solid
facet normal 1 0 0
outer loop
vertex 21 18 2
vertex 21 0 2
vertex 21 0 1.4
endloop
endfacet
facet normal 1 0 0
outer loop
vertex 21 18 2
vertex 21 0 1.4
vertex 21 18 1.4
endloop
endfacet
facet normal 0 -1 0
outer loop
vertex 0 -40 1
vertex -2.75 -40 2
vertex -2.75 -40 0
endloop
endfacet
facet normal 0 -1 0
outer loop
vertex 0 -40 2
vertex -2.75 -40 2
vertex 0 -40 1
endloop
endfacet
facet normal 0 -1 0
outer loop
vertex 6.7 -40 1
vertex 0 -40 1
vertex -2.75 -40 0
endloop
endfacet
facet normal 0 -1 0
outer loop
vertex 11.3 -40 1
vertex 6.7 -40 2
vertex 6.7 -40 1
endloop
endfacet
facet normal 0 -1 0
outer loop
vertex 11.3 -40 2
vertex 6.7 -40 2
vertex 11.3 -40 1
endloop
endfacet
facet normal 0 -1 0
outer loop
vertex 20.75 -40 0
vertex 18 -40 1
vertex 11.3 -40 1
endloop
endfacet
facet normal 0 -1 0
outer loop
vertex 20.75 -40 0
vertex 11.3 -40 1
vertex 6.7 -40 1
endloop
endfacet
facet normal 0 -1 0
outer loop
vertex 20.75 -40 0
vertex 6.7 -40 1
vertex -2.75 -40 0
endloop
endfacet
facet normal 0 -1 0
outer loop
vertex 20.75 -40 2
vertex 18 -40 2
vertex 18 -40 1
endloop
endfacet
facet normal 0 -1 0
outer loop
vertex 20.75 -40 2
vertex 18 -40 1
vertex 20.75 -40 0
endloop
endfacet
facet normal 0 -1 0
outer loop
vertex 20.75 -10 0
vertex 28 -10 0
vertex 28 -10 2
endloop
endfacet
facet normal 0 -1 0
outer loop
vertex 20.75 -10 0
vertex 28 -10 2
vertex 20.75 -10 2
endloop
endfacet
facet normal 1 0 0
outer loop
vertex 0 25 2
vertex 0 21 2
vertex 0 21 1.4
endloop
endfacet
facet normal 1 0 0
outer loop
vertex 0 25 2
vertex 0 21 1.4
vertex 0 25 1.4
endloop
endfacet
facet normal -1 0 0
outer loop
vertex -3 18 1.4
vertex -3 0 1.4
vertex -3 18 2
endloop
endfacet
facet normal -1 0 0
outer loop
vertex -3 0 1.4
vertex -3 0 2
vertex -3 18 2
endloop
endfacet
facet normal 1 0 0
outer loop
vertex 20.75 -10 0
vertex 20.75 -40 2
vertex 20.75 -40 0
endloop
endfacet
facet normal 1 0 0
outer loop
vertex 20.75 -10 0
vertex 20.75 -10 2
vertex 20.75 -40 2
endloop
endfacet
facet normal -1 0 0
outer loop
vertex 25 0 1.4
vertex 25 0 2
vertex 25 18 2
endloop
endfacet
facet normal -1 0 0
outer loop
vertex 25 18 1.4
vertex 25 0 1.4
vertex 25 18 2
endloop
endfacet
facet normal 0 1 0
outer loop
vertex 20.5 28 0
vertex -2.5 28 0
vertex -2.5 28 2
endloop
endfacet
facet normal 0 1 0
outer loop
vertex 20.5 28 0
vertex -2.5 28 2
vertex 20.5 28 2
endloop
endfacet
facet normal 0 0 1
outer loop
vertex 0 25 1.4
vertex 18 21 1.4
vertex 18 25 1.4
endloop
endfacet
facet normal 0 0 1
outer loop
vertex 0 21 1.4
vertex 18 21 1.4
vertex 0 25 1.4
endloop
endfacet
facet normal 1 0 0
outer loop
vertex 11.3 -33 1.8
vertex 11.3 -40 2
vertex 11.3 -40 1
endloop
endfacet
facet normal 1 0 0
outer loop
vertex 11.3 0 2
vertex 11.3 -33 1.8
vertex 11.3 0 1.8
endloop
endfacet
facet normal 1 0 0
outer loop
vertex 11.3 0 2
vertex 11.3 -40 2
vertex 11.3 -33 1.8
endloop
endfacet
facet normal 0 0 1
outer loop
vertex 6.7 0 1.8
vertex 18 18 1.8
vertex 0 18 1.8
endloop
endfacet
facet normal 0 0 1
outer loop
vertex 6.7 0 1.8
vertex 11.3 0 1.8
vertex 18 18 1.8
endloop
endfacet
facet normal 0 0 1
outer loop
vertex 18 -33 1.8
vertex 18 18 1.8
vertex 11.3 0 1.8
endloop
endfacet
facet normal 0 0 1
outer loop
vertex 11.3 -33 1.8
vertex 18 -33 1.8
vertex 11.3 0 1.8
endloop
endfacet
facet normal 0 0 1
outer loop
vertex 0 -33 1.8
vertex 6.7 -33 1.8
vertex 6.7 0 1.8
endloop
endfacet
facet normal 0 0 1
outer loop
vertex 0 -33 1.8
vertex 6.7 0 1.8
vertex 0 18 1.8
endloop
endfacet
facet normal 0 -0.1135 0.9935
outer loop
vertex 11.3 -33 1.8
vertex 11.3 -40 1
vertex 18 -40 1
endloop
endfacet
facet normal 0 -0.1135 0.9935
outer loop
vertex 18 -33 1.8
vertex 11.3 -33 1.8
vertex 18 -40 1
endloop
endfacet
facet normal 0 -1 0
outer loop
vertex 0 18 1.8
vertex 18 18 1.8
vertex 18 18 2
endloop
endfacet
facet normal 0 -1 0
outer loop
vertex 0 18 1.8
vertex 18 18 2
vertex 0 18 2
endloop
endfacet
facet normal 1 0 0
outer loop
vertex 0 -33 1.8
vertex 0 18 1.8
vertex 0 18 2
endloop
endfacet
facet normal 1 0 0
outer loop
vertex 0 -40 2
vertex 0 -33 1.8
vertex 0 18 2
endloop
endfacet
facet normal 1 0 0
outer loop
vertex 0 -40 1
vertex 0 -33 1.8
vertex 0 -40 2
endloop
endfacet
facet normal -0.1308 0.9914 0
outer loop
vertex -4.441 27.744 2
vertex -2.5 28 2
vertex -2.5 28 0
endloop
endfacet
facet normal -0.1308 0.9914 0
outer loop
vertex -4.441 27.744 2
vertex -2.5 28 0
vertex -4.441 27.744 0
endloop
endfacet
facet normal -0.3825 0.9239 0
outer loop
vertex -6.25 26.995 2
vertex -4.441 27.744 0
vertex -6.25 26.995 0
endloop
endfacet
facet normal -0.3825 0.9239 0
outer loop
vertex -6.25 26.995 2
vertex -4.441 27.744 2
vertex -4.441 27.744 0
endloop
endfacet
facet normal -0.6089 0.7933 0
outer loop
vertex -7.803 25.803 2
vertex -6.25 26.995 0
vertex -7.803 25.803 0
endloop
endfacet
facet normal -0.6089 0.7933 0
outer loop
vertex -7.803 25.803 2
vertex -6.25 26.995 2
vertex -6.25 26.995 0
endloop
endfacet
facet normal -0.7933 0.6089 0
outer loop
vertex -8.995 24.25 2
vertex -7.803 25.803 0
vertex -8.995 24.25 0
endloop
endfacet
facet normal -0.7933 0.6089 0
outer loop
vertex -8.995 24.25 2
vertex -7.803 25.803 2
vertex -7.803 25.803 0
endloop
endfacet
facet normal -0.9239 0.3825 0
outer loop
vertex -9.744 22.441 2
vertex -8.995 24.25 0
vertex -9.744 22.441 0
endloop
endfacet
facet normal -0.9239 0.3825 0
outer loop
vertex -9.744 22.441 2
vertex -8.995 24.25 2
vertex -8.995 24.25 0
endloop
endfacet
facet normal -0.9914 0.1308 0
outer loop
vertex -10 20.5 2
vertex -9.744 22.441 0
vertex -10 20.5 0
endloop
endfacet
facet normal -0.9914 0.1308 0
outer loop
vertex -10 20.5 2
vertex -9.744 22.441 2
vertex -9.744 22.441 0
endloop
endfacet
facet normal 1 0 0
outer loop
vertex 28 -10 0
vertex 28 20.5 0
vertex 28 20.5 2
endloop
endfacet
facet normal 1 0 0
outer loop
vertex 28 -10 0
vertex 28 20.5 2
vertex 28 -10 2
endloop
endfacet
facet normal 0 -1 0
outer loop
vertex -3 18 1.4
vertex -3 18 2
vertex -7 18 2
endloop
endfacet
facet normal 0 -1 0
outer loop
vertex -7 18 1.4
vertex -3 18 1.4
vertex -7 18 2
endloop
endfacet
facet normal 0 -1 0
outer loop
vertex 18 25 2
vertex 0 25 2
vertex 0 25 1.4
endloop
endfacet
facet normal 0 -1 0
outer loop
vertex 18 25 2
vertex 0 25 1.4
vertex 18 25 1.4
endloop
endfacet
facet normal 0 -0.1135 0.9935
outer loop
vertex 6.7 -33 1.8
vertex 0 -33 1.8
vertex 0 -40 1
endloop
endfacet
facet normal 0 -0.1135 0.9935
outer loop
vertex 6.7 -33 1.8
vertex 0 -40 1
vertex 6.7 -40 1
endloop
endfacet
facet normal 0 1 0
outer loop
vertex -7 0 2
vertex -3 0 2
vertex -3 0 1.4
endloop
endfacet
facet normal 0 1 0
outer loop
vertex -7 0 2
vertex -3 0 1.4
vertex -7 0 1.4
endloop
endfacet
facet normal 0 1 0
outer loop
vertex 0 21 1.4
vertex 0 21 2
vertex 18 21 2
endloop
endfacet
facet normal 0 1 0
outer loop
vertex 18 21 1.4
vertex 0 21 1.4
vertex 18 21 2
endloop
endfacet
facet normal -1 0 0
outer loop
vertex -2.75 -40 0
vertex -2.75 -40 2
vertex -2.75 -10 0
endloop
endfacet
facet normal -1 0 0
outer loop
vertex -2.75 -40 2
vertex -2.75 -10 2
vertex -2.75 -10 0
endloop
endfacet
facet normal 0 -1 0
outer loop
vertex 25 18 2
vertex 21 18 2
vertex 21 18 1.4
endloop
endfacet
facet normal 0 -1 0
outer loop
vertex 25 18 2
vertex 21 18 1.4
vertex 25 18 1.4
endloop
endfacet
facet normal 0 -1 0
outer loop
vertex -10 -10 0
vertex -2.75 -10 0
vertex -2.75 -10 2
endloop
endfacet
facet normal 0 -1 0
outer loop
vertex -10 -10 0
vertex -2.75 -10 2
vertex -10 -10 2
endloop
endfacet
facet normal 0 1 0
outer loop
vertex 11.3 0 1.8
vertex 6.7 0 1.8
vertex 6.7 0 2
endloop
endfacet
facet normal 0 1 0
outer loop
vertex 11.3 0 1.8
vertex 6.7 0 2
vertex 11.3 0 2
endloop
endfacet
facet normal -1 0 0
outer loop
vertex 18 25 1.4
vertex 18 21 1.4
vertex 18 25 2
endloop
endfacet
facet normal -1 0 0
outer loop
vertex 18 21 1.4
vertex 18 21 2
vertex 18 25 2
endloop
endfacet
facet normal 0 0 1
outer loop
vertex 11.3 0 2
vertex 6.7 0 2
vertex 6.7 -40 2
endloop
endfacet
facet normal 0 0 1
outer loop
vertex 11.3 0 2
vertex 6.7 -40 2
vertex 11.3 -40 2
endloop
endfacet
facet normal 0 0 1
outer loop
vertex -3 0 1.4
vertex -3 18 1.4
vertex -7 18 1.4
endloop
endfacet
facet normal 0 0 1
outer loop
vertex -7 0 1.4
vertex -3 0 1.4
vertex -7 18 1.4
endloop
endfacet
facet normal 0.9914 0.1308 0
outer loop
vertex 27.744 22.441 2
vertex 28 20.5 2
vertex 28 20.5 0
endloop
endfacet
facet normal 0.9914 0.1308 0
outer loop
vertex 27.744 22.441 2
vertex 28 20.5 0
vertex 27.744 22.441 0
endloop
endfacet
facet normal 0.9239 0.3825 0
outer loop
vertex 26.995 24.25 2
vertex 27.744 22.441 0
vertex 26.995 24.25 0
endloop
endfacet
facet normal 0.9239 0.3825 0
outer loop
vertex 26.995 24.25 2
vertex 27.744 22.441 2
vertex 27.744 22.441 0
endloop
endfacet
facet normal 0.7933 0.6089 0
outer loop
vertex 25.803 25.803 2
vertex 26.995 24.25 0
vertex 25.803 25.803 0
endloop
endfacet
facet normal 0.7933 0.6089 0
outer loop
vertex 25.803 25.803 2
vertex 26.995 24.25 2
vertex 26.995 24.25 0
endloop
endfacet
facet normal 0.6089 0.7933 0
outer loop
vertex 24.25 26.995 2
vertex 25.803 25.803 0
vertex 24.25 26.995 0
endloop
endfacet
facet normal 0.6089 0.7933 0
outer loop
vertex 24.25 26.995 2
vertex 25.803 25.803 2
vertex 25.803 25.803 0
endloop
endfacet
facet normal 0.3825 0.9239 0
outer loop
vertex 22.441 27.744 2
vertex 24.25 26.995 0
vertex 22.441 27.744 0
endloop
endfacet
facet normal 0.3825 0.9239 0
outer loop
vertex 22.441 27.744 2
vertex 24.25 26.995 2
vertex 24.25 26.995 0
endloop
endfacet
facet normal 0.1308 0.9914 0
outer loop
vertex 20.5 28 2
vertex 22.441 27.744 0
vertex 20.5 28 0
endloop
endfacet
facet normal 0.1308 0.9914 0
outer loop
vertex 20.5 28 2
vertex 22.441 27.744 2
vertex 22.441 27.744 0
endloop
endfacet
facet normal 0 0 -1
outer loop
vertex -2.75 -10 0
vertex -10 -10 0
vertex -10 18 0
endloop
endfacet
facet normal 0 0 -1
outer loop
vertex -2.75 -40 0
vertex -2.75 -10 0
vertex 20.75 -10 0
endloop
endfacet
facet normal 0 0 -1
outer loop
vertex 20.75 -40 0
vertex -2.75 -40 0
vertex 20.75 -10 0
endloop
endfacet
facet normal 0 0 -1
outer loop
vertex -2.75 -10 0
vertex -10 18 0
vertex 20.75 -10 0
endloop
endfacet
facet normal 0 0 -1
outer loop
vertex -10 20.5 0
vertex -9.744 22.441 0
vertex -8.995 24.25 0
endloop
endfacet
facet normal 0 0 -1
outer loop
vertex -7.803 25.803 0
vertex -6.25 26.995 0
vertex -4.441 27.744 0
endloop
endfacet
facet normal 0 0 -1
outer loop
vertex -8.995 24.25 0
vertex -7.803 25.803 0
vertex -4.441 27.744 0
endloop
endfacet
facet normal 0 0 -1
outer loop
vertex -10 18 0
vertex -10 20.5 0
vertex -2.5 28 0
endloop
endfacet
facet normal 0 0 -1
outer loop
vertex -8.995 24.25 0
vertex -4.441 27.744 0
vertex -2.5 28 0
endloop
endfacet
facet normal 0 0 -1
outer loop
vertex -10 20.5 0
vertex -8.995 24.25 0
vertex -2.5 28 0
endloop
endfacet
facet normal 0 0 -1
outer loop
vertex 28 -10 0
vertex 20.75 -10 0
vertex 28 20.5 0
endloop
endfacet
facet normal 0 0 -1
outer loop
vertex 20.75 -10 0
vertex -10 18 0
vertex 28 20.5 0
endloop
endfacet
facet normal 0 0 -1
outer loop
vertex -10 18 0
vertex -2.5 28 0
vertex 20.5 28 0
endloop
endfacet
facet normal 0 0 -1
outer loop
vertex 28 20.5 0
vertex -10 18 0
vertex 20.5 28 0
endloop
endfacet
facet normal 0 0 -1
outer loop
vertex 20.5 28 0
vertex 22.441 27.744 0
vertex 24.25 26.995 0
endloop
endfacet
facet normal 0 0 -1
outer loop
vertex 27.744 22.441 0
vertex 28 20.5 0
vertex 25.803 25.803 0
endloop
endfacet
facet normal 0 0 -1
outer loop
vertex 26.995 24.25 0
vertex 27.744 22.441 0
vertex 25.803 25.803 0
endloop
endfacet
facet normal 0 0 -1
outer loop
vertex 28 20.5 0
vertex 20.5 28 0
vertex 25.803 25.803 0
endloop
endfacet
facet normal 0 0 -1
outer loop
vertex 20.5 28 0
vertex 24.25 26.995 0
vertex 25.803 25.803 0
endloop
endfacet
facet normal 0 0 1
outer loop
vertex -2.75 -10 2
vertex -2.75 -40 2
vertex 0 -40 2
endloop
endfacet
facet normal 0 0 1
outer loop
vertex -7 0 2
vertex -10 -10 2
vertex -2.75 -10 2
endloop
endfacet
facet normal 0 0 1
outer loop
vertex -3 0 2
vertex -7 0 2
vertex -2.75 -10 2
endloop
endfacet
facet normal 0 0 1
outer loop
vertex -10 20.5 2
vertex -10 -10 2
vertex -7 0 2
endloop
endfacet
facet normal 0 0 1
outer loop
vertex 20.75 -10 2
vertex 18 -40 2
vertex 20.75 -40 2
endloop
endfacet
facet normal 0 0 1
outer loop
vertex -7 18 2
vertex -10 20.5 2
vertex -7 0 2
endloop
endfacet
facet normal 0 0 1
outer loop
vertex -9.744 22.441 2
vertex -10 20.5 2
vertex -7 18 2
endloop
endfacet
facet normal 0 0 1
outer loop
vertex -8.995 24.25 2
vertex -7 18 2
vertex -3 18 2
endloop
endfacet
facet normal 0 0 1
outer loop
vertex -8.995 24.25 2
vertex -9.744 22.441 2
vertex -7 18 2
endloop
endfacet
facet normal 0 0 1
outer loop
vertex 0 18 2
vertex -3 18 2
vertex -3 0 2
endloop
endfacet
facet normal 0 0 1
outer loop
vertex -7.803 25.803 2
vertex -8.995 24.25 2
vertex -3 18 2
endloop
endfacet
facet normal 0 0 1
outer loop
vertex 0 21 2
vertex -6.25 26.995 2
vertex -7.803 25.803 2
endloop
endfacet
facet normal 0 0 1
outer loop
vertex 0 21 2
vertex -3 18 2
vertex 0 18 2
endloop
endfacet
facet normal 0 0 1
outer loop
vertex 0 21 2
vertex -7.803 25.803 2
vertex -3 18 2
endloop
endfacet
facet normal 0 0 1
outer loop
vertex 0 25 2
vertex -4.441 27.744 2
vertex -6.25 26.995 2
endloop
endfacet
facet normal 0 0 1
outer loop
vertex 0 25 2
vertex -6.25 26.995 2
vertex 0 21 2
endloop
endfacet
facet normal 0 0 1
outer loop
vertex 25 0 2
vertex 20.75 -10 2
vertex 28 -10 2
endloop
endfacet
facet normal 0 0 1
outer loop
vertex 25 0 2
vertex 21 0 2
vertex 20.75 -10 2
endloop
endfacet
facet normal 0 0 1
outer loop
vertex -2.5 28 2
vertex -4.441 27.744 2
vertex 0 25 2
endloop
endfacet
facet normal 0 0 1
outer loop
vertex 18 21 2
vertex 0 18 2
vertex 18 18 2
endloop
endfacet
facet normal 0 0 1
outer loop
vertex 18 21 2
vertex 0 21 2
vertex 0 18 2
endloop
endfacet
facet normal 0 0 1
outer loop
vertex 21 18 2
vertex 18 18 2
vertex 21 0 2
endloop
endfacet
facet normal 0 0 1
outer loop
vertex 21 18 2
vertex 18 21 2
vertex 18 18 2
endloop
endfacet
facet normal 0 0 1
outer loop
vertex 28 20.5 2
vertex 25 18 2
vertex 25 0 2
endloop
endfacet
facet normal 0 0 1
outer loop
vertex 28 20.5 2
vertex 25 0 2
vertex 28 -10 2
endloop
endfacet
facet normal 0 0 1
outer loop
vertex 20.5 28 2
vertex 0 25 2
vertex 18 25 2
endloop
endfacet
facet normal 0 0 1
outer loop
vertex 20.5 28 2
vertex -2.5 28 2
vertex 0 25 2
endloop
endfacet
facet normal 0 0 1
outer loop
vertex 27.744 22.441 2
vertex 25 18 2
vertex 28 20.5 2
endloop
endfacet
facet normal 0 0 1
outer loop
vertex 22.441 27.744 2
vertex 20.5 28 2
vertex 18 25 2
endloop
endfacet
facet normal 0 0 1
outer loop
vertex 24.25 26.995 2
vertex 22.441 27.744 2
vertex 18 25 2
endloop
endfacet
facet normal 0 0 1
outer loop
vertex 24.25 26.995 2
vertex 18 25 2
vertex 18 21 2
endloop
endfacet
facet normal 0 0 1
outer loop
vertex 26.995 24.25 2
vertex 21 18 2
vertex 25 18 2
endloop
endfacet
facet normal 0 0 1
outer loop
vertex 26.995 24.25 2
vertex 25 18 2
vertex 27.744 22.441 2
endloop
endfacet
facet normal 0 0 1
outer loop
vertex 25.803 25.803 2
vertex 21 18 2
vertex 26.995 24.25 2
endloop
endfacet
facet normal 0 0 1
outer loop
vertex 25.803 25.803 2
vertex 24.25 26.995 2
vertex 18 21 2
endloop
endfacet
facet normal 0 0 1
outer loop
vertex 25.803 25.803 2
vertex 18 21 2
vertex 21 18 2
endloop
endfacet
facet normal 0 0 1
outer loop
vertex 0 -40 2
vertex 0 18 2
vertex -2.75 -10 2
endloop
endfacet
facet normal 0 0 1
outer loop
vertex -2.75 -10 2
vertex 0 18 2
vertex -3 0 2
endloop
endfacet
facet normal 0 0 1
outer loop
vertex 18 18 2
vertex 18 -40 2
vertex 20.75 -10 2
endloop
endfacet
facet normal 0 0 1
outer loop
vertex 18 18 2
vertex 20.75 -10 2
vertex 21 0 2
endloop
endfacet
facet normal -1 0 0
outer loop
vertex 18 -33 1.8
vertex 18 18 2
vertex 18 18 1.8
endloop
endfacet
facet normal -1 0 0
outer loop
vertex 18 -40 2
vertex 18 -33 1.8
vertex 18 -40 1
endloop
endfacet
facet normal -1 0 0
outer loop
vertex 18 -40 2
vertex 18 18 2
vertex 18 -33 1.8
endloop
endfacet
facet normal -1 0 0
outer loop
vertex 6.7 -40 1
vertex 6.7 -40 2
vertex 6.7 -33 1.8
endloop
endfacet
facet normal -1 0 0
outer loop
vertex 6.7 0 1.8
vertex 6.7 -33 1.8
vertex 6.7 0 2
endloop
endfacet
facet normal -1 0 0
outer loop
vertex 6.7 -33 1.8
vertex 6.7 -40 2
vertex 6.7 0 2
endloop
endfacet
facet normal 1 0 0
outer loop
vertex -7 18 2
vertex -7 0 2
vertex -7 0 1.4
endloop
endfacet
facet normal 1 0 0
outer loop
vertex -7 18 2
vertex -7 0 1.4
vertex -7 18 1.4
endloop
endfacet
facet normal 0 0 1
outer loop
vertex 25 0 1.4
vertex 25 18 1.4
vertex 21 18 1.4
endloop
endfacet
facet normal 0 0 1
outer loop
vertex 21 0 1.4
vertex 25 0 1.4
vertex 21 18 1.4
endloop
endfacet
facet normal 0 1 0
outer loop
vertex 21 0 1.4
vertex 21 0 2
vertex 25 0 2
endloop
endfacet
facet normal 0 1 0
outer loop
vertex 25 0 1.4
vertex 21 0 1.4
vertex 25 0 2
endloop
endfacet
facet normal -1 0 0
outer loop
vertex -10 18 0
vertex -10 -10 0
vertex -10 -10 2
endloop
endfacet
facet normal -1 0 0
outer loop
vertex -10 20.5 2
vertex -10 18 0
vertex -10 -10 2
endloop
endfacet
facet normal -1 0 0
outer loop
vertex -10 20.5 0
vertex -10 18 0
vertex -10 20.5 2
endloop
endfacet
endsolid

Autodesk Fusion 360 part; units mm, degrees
sketch "Sketch1" plane through (0, 0, 0) normal (0, 0, 1) x (1, 0, 0)
  line L0 (0, 0) -> (18, 0)
  line L1 (18, 0) -> (18, 18)
  line L2 (18, 18) -> (0, 18)
  line L3 (0, 18) -> (0, 0)
  line L4 (0, 18) -> (-10, 18)
  line L5 (-10, 18) -> (-10, 28)
  line L6 (-10, 28) -> (28, 28)
  line L7 (28, 28) -> (28, -10)
  line L8 (28, -10) -> (-10, -10)
  line L9 (-10, -10) -> (-10, 28)
  dimension "d1" = 18
  dimension "d2" = 18
  dimension "d3" = 10
  dimension "d4" = 10
  dimension "d5" = 10
  dimension "d6" = 10
extrude "Extrude1" add sketch "Sketch1" along normal blind 2
extrude "Extrude2" add sketch "Sketch1" along normal blind 1.8 contours L0 L1 L2 L3
sketch "Sketch2" plane through (0, -10, 0) normal (0, -1, 0) x (1, 0, 0)
  line L0 (-10, 0) -> (28, 0)
  line L1 (28, 0) -> (28, 2)
  line L2 (28, 2) -> (-10, 2)
  line L3 (-10, 2) -> (-10, 0)
  line L4 (9, 2) -> (-2.75, 2)
  line L5 (9, 2) -> (20.75, 2)
  line L6 (-2.75, 2) -> (-2.75, 0)
  line L7 (20.75, 2) -> (20.75, 0)
  dimension "d11" = 11.75
  dimension "d12" = 11.75
extrude "Extrude3" add sketch "Sketch2" along normal blind 30 contours L0 L2 L4 L5 L6 L7
sketch "Sketch3" plane through (0, 0, 2) normal (0, 0, 1) x (-1, 0, 0)
  line L0 (0, 0) -> (0, -18)
  line L1 (0, -18) -> (-18, -18)
  line L2 (-18, -18) -> (-18, 0)
  line L3 (-18, 0) -> (0, 0)
  line L4 (10, 10) -> (2.75, 10)
  line L5 (2.75, 10) -> (2.75, 40)
  line L6 (2.75, 40) -> (-20.75, 40)
  line L7 (-20.75, 40) -> (-20.75, 10)
  line L8 (-20.75, 10) -> (-28, 10)
  line L9 (-28, 10) -> (-28, -28)
  line L10 (-28, -28) -> (10, -28)
  line L11 (10, -28) -> (10, 10)
  line L12 (-9, 40) -> (-9, 0)
  line L13 (-31.221, 25) -> (-24.871, 25)
  line L14 (-9, 40) -> (-20.75, 40)
  line L15 (-9, 40) -> (2.75, 40)
  line L16 (0, 0) -> (0, 40)
  line L17 (0, 40) -> (-6.7, 40)
  line L18 (-6.7, 40) -> (-6.7, 0)
  line L19 (-18, 0) -> (-18, 40)
  line L20 (-11.3, 40) -> (-11.3, 0)
  line L21 (-18, 40) -> (-11.3, 40)
  dimension "d15" = 6.35
  dimension "d18" = 6.7
extrude "Extrude4" cut sketch "Sketch3" against normal blind 0.2 contours L3 L6 L15 L16 L17 L18 | L3 L6 L14 L19 L20 L21
chamfer "Chamfer1" distance 0.8 distance2 7 2 edges at (14.65, -40, 1.8) (3.35, -40, 1.8) measured on face at (8.2333, -40, 0.6) measured on face at (8.2333, -40, 0.6)
fillet "Fillet1" radius 7.5 2 edges at (-10, 28, 1) (28, 28, 1)
sketch "Sketch4" plane through (0, 0, 2) normal (0, 0, 1) x (-1, 0, 0)
  arc A0 (-28, -20.5) -> (-20.5, -28) centre (-20.5, -20.5) ccw
  line L0 (-20.5, -28) -> (2.5, -28)
  arc A1 (2.5, -28) -> (10, -20.5) centre (2.5, -20.5) ccw
  line L1 (10, -20.5) -> (10, 10)
  line L2 (10, 10) -> (2.75, 10)
  line L3 (2.75, 10) -> (2.75, 40)
  line L4 (2.75, 40) -> (0, 40)
  line L5 (0, 40) -> (0, -18)
  line L6 (0, -18) -> (-18, -18)
  line L7 (-18, -18) -> (-18, 40)
  line L8 (-18, 40) -> (-20.75, 40)
  line L9 (-20.75, 40) -> (-20.75, 10)
  line L10 (-20.75, 10) -> (-28, 10)
  line L11 (-28, 10) -> (-28, -20.5)
  line L12 (0, -18) -> (10, -18)
  line L13 (5, -18) -> (5, 0)
  line L14 (5, 0) -> (3, 0)
  line L15 (3, 0) -> (3, -18)
  line L16 (5, 0) -> (7, 0)
  line L17 (7, 0) -> (7, -18)
  line L18 (-9, -18) -> (-9, -9)
  line L19 (-25, 0) -> (-25, -18)
  line L20 (-23, -18) -> (-23, 0)
  line L21 (-21, 0) -> (-21, -18)
  line L22 (-18, -18) -> (-28, -18)
  line L23 (-23, 0) -> (-21, 0)
  line L24 (-23, 0) -> (-25, 0)
  line L25 (-18, -18) -> (0, 0)
  line L26 (0, -21) -> (-18, -21)
  line L27 (-18, -23) -> (0, -23)
  line L28 (0, -25) -> (-18, -25)
  line L29 (-18, -18) -> (-18, -28)
  line L30 (0, -23) -> (0, -21)
  line L31 (0, -23) -> (0, -25)
  dimension "d25" = 2
  dimension "d26" = 2
extrude "Extrude5" cut sketch "Sketch4" against normal blind 0.6 contours L19 L20 L22 L24 | L27 L28 L29 L31 | L20 L21 L22 L23 | L26 L27 L29 L30 | L12 L13 L16 L17 | L12 L13 L14 L15
